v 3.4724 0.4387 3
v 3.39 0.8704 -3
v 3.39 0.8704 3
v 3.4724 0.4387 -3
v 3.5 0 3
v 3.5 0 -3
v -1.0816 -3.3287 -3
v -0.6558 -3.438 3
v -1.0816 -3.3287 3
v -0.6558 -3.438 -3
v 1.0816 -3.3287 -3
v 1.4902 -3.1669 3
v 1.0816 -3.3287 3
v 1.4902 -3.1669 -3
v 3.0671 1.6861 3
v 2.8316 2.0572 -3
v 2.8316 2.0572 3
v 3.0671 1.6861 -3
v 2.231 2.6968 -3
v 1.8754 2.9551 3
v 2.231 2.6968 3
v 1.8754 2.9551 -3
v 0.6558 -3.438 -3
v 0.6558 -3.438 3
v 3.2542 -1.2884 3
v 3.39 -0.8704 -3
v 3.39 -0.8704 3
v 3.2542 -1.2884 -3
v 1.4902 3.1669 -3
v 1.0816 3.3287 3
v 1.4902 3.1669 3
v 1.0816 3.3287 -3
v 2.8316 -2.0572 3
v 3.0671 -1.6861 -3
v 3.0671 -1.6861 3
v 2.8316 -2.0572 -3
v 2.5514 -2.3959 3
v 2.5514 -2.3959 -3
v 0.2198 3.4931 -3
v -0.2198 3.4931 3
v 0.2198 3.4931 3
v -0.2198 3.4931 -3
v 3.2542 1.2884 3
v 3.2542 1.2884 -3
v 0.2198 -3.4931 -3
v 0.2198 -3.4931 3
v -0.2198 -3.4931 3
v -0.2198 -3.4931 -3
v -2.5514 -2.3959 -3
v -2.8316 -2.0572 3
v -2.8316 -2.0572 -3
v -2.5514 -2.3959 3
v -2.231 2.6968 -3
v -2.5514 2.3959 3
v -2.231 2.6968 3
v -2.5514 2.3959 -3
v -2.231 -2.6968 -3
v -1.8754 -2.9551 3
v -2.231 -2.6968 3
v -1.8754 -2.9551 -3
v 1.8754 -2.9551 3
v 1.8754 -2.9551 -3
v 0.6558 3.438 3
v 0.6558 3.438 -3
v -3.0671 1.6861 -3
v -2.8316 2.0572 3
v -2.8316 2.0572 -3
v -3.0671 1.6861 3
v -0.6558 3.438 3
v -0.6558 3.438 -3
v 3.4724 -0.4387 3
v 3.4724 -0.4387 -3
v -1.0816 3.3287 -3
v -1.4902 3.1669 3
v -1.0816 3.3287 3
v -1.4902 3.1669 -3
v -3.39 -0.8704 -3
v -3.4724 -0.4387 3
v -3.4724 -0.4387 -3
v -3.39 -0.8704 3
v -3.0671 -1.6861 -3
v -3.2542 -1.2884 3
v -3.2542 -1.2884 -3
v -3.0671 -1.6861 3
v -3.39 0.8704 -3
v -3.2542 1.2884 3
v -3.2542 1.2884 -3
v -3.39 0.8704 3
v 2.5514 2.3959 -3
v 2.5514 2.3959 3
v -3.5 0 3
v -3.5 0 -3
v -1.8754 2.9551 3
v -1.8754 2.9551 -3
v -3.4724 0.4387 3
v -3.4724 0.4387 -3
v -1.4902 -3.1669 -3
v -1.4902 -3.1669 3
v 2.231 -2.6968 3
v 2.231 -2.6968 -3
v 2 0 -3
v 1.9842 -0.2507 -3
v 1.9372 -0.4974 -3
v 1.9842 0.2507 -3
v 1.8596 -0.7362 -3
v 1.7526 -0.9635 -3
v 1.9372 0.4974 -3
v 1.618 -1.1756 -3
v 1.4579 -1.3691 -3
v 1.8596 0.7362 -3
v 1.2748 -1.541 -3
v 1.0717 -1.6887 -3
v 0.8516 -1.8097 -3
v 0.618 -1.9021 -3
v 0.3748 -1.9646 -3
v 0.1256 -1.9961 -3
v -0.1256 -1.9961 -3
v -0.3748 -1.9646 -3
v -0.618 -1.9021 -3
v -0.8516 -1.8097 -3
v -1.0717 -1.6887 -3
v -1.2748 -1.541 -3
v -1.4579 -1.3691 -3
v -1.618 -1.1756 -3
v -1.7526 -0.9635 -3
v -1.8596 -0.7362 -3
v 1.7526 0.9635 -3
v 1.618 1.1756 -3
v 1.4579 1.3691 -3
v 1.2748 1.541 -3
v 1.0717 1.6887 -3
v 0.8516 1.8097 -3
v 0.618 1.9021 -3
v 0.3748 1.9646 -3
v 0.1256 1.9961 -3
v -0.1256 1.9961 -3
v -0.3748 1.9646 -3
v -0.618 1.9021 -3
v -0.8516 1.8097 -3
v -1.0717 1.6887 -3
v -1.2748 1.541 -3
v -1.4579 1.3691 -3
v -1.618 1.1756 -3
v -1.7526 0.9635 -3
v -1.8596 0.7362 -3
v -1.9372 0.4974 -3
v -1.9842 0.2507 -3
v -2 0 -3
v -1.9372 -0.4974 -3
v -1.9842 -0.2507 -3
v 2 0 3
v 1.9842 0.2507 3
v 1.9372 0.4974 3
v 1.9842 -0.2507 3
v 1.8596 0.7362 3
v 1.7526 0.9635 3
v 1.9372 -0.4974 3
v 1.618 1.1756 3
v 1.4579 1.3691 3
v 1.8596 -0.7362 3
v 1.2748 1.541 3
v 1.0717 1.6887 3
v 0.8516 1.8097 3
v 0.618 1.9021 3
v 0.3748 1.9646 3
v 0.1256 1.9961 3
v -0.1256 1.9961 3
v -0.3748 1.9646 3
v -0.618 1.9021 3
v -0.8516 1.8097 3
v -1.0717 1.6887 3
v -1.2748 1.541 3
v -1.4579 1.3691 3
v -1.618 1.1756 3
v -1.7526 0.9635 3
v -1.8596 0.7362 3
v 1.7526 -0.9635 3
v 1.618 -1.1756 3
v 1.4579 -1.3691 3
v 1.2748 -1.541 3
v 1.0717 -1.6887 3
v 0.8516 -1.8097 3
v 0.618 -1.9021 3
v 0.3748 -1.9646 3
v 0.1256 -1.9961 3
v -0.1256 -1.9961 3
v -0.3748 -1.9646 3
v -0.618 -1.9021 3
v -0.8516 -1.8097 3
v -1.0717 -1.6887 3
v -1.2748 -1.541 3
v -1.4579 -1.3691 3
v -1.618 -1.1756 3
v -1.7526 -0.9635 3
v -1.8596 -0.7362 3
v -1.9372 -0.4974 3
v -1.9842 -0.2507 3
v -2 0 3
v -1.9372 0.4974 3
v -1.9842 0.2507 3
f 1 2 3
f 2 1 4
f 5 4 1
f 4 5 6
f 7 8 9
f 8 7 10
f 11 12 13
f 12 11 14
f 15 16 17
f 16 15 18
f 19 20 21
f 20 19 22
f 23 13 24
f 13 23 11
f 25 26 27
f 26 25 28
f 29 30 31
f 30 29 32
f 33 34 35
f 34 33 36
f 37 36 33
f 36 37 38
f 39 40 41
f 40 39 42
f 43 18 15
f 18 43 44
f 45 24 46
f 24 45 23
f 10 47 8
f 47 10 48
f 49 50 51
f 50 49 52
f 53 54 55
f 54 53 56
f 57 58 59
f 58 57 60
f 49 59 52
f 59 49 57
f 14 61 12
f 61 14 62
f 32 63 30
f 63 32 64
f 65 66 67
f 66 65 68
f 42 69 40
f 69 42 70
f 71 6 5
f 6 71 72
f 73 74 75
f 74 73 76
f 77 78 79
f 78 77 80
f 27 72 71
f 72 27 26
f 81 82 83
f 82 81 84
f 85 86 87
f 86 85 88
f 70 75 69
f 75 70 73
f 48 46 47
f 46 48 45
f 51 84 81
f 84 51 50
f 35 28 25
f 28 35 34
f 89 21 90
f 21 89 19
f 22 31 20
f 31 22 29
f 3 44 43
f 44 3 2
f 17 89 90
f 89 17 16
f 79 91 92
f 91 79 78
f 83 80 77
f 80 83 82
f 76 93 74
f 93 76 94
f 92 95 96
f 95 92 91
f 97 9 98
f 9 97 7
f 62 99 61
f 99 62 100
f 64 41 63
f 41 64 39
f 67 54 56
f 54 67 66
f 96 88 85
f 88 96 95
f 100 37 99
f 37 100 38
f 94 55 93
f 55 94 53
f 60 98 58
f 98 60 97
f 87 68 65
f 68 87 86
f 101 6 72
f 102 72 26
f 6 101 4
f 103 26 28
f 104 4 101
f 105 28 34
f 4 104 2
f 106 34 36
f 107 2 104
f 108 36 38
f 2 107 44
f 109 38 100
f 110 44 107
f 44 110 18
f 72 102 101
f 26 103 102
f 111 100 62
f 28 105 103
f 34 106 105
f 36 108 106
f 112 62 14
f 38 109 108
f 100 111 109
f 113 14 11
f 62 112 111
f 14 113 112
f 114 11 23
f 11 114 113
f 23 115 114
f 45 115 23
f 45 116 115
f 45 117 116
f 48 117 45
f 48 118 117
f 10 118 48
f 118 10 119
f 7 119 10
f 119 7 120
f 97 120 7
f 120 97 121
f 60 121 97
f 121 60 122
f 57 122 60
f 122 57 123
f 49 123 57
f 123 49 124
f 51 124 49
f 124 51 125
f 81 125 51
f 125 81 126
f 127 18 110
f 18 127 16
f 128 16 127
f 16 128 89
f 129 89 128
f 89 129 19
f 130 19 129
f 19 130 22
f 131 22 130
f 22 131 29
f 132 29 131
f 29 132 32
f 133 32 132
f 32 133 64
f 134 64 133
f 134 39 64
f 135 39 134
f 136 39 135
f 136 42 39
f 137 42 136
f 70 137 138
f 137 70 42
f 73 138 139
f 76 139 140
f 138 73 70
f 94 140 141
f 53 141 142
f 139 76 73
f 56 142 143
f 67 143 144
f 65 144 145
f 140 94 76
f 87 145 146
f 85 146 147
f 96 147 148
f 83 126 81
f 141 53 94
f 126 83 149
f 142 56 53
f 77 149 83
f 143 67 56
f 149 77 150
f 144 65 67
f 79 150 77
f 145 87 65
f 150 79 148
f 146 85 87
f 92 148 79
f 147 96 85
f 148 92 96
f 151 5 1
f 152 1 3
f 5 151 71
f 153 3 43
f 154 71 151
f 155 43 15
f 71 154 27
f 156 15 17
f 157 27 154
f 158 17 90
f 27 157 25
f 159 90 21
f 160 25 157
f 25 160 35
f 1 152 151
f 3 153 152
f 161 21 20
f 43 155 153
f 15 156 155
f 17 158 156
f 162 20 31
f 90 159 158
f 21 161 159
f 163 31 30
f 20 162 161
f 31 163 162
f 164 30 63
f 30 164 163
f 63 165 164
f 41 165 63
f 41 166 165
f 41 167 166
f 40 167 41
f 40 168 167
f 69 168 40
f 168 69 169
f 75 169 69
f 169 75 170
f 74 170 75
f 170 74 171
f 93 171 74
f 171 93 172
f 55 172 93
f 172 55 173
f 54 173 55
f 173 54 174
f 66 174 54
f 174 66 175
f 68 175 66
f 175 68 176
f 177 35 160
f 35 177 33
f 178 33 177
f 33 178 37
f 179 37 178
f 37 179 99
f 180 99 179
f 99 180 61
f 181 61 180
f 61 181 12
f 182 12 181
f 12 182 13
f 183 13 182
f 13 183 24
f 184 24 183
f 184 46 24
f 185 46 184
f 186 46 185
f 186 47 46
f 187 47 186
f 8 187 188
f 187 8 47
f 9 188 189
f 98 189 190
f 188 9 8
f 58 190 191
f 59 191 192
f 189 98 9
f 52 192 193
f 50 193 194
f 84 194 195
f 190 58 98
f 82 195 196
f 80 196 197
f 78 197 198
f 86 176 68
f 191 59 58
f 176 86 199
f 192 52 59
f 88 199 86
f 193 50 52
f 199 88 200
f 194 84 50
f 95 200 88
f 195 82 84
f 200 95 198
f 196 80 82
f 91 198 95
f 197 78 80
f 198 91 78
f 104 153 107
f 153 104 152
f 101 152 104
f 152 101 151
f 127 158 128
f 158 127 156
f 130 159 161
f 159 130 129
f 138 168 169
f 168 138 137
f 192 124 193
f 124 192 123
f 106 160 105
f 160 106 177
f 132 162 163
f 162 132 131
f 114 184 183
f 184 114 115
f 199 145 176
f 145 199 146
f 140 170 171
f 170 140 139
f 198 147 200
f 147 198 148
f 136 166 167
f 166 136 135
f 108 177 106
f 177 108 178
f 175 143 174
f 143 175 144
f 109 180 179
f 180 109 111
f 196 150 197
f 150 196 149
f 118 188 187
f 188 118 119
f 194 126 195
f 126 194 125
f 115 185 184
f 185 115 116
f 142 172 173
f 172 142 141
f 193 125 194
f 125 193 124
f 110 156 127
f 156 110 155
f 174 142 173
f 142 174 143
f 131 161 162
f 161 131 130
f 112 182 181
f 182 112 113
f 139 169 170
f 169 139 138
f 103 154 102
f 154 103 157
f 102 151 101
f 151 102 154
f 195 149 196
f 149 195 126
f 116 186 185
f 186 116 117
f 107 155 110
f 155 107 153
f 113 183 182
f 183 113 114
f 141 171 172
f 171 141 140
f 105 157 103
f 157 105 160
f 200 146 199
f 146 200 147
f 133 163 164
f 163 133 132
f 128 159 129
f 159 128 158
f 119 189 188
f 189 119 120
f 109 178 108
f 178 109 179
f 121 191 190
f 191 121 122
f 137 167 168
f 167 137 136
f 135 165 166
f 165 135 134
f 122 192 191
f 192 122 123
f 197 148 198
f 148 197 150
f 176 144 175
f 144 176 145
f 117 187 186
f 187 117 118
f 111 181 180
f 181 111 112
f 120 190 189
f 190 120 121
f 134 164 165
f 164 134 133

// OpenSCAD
$fn = 50;


difference() {
	union() {
		translate(v = [0, 0, -3.0000000000]) {
			cylinder(h = 6, r = 3.5000000000);
		}
	}
	union() {
		translate(v = [0, 0, -100.0000000000]) {
			cylinder(h = 200, r = 2.0000000000);
		}
	}
}
